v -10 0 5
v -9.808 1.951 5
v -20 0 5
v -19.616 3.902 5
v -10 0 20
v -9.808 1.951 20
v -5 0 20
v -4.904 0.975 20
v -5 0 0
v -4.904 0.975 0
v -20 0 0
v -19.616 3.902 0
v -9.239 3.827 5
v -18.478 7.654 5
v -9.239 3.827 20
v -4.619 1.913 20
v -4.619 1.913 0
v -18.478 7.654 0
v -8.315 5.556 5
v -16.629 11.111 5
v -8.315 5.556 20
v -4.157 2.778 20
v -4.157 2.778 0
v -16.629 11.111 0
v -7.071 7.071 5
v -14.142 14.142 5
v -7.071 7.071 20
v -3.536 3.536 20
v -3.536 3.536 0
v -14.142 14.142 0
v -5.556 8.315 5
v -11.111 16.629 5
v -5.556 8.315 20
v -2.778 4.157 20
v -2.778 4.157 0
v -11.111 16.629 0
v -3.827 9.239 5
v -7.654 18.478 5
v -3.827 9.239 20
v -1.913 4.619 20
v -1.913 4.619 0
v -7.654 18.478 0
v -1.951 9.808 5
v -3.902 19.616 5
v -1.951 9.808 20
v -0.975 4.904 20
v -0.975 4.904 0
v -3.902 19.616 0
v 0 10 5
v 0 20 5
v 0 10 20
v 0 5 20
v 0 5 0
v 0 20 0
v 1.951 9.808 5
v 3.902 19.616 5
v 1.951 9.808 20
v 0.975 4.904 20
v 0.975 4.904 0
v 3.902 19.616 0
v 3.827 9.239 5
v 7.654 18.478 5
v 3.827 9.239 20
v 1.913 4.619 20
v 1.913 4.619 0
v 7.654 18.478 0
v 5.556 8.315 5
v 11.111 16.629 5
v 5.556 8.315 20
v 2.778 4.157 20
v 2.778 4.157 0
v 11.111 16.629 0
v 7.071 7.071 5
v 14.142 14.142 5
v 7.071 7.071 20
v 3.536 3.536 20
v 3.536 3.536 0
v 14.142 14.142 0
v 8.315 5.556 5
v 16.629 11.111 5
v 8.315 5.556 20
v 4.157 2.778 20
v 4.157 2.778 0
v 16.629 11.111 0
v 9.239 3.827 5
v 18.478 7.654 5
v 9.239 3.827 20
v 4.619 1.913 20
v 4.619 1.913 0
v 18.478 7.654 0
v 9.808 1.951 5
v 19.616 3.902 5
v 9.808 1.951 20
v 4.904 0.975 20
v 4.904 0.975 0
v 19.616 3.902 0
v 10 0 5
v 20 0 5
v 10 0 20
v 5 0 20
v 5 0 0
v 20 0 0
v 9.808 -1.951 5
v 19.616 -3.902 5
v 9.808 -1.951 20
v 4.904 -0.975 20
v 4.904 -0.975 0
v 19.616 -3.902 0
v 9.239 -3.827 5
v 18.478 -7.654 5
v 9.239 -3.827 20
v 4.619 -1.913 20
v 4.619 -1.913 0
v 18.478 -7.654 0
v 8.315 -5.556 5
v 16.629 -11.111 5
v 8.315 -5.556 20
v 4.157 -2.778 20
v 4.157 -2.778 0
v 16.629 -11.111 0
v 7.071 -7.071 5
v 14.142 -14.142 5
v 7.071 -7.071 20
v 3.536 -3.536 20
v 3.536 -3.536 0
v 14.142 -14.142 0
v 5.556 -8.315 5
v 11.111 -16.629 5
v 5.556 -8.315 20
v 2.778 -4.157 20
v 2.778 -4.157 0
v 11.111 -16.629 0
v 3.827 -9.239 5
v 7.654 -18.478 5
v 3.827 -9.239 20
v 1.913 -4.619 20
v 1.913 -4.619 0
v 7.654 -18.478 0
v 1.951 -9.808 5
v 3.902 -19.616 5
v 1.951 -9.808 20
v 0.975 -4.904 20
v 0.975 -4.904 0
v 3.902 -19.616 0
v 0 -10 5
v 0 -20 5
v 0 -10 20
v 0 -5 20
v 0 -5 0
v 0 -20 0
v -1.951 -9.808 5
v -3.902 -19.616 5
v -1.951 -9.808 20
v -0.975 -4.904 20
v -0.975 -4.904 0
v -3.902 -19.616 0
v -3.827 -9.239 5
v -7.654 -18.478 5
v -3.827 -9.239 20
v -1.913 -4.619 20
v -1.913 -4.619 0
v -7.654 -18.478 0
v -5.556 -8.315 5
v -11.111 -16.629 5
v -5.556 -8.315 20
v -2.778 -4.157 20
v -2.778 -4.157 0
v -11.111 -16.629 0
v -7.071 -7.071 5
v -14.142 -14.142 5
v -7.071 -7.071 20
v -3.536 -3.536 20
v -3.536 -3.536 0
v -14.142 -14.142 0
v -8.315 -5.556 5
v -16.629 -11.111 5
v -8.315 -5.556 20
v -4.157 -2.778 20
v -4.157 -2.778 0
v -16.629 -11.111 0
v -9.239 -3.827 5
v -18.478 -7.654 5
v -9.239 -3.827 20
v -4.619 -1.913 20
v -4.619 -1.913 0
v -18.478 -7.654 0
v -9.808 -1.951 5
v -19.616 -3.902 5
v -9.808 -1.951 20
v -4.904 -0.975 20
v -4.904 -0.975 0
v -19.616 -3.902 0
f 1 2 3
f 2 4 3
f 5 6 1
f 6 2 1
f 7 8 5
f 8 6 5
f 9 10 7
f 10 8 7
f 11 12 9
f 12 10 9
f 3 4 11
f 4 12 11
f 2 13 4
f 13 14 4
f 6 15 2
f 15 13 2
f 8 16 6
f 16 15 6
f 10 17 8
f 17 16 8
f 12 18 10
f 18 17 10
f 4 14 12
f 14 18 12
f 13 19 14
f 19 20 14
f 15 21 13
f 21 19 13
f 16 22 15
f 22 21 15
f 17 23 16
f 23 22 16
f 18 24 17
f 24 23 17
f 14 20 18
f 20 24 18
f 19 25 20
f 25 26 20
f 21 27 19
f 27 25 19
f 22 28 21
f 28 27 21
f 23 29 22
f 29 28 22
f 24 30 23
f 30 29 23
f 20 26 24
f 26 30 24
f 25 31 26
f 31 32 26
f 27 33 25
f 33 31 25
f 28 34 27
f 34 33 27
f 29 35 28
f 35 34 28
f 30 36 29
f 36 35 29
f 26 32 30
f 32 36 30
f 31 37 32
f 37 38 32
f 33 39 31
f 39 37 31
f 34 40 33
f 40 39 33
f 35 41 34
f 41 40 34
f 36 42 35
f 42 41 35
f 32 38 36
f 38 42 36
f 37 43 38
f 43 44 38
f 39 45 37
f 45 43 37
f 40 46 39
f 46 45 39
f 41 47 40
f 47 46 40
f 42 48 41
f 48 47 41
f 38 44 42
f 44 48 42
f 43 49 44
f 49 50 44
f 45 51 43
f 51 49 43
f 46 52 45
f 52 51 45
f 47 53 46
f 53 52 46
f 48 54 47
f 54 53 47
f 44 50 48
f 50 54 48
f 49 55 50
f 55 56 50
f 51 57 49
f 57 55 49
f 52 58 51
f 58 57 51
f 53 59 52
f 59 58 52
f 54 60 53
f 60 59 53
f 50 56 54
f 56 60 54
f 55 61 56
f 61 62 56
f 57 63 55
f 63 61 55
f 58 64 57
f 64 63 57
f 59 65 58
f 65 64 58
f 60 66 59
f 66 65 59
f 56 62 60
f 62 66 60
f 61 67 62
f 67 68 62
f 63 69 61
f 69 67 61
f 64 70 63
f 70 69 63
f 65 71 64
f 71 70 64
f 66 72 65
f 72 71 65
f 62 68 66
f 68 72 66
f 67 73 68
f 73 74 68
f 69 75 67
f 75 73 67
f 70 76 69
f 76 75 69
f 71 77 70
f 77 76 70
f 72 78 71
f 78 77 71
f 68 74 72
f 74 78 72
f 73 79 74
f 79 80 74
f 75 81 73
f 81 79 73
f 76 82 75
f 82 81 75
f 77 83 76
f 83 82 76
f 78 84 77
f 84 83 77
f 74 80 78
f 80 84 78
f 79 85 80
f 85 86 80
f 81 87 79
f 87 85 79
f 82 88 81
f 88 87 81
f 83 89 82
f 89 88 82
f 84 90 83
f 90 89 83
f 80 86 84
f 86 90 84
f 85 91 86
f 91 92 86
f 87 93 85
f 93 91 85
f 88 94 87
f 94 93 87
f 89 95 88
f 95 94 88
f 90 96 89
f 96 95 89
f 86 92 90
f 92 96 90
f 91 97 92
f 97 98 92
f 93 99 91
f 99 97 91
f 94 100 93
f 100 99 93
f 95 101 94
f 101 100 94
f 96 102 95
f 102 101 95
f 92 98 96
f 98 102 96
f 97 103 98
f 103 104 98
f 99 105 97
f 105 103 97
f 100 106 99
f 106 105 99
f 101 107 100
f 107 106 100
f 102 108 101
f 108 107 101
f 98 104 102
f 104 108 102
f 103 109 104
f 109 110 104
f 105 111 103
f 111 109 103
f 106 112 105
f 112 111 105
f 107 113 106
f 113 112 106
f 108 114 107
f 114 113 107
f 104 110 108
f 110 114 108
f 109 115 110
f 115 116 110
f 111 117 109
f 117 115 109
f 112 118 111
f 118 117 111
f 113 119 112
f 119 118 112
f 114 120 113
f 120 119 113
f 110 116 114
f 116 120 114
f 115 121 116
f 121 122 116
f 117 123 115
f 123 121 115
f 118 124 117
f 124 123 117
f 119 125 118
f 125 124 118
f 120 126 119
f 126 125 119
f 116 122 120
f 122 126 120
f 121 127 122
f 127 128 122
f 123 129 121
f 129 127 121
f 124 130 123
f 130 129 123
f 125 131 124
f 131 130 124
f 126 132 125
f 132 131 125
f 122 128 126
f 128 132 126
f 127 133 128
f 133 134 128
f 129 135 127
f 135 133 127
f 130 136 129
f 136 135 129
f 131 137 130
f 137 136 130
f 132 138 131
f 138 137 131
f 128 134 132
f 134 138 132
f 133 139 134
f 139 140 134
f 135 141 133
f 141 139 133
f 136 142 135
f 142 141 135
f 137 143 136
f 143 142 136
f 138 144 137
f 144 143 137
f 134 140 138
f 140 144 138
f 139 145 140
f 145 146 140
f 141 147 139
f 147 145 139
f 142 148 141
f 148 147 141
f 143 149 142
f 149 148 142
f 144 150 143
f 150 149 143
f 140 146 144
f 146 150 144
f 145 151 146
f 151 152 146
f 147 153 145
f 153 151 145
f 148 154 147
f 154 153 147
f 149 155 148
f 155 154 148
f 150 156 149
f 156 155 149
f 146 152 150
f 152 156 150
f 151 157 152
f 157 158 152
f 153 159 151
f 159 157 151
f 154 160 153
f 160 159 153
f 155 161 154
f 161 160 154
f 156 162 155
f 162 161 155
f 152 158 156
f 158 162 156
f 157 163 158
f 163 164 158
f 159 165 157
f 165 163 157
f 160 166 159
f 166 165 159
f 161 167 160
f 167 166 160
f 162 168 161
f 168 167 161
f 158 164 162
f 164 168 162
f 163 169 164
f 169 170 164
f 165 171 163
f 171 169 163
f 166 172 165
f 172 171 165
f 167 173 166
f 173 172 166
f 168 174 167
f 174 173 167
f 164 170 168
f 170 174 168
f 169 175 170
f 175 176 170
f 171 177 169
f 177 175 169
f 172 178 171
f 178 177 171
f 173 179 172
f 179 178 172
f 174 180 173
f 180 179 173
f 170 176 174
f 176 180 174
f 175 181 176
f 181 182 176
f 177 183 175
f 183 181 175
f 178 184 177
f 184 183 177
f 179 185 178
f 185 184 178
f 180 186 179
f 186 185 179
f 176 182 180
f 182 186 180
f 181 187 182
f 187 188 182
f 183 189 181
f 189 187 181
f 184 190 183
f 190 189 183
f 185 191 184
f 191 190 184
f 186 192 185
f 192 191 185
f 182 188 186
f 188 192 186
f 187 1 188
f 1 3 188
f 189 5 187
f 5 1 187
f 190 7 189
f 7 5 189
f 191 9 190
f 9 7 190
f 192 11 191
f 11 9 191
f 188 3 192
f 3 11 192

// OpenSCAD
$fn = 32;

// ----------------------------------------------------------------------
// Revolved part: flanged bushing R20
// ----------------------------------------------------------------------

// --- parameters (mm) ---
bore_r = 5;               // bore radius
flange_r = 20;            // flange radius
flange_h = 5;             // flange thickness
sleeve_r = 10;            // sleeve radius
total_h = 20;             // overall height
revolve_angle = 360;      // revolve sweep, degrees

bore_d = 2 * bore_r;
flange_d = 2 * flange_r;
sleeve_d = 2 * sleeve_r;

profile = [[5, 0], [20, 0], [20, 5], [10, 5], [10, 20], [5, 20]];  // primary outline, 6 points, counter clockwise

// --- the one profile operation ---
rotate_extrude(angle = revolve_angle) polygon(points = profile);
